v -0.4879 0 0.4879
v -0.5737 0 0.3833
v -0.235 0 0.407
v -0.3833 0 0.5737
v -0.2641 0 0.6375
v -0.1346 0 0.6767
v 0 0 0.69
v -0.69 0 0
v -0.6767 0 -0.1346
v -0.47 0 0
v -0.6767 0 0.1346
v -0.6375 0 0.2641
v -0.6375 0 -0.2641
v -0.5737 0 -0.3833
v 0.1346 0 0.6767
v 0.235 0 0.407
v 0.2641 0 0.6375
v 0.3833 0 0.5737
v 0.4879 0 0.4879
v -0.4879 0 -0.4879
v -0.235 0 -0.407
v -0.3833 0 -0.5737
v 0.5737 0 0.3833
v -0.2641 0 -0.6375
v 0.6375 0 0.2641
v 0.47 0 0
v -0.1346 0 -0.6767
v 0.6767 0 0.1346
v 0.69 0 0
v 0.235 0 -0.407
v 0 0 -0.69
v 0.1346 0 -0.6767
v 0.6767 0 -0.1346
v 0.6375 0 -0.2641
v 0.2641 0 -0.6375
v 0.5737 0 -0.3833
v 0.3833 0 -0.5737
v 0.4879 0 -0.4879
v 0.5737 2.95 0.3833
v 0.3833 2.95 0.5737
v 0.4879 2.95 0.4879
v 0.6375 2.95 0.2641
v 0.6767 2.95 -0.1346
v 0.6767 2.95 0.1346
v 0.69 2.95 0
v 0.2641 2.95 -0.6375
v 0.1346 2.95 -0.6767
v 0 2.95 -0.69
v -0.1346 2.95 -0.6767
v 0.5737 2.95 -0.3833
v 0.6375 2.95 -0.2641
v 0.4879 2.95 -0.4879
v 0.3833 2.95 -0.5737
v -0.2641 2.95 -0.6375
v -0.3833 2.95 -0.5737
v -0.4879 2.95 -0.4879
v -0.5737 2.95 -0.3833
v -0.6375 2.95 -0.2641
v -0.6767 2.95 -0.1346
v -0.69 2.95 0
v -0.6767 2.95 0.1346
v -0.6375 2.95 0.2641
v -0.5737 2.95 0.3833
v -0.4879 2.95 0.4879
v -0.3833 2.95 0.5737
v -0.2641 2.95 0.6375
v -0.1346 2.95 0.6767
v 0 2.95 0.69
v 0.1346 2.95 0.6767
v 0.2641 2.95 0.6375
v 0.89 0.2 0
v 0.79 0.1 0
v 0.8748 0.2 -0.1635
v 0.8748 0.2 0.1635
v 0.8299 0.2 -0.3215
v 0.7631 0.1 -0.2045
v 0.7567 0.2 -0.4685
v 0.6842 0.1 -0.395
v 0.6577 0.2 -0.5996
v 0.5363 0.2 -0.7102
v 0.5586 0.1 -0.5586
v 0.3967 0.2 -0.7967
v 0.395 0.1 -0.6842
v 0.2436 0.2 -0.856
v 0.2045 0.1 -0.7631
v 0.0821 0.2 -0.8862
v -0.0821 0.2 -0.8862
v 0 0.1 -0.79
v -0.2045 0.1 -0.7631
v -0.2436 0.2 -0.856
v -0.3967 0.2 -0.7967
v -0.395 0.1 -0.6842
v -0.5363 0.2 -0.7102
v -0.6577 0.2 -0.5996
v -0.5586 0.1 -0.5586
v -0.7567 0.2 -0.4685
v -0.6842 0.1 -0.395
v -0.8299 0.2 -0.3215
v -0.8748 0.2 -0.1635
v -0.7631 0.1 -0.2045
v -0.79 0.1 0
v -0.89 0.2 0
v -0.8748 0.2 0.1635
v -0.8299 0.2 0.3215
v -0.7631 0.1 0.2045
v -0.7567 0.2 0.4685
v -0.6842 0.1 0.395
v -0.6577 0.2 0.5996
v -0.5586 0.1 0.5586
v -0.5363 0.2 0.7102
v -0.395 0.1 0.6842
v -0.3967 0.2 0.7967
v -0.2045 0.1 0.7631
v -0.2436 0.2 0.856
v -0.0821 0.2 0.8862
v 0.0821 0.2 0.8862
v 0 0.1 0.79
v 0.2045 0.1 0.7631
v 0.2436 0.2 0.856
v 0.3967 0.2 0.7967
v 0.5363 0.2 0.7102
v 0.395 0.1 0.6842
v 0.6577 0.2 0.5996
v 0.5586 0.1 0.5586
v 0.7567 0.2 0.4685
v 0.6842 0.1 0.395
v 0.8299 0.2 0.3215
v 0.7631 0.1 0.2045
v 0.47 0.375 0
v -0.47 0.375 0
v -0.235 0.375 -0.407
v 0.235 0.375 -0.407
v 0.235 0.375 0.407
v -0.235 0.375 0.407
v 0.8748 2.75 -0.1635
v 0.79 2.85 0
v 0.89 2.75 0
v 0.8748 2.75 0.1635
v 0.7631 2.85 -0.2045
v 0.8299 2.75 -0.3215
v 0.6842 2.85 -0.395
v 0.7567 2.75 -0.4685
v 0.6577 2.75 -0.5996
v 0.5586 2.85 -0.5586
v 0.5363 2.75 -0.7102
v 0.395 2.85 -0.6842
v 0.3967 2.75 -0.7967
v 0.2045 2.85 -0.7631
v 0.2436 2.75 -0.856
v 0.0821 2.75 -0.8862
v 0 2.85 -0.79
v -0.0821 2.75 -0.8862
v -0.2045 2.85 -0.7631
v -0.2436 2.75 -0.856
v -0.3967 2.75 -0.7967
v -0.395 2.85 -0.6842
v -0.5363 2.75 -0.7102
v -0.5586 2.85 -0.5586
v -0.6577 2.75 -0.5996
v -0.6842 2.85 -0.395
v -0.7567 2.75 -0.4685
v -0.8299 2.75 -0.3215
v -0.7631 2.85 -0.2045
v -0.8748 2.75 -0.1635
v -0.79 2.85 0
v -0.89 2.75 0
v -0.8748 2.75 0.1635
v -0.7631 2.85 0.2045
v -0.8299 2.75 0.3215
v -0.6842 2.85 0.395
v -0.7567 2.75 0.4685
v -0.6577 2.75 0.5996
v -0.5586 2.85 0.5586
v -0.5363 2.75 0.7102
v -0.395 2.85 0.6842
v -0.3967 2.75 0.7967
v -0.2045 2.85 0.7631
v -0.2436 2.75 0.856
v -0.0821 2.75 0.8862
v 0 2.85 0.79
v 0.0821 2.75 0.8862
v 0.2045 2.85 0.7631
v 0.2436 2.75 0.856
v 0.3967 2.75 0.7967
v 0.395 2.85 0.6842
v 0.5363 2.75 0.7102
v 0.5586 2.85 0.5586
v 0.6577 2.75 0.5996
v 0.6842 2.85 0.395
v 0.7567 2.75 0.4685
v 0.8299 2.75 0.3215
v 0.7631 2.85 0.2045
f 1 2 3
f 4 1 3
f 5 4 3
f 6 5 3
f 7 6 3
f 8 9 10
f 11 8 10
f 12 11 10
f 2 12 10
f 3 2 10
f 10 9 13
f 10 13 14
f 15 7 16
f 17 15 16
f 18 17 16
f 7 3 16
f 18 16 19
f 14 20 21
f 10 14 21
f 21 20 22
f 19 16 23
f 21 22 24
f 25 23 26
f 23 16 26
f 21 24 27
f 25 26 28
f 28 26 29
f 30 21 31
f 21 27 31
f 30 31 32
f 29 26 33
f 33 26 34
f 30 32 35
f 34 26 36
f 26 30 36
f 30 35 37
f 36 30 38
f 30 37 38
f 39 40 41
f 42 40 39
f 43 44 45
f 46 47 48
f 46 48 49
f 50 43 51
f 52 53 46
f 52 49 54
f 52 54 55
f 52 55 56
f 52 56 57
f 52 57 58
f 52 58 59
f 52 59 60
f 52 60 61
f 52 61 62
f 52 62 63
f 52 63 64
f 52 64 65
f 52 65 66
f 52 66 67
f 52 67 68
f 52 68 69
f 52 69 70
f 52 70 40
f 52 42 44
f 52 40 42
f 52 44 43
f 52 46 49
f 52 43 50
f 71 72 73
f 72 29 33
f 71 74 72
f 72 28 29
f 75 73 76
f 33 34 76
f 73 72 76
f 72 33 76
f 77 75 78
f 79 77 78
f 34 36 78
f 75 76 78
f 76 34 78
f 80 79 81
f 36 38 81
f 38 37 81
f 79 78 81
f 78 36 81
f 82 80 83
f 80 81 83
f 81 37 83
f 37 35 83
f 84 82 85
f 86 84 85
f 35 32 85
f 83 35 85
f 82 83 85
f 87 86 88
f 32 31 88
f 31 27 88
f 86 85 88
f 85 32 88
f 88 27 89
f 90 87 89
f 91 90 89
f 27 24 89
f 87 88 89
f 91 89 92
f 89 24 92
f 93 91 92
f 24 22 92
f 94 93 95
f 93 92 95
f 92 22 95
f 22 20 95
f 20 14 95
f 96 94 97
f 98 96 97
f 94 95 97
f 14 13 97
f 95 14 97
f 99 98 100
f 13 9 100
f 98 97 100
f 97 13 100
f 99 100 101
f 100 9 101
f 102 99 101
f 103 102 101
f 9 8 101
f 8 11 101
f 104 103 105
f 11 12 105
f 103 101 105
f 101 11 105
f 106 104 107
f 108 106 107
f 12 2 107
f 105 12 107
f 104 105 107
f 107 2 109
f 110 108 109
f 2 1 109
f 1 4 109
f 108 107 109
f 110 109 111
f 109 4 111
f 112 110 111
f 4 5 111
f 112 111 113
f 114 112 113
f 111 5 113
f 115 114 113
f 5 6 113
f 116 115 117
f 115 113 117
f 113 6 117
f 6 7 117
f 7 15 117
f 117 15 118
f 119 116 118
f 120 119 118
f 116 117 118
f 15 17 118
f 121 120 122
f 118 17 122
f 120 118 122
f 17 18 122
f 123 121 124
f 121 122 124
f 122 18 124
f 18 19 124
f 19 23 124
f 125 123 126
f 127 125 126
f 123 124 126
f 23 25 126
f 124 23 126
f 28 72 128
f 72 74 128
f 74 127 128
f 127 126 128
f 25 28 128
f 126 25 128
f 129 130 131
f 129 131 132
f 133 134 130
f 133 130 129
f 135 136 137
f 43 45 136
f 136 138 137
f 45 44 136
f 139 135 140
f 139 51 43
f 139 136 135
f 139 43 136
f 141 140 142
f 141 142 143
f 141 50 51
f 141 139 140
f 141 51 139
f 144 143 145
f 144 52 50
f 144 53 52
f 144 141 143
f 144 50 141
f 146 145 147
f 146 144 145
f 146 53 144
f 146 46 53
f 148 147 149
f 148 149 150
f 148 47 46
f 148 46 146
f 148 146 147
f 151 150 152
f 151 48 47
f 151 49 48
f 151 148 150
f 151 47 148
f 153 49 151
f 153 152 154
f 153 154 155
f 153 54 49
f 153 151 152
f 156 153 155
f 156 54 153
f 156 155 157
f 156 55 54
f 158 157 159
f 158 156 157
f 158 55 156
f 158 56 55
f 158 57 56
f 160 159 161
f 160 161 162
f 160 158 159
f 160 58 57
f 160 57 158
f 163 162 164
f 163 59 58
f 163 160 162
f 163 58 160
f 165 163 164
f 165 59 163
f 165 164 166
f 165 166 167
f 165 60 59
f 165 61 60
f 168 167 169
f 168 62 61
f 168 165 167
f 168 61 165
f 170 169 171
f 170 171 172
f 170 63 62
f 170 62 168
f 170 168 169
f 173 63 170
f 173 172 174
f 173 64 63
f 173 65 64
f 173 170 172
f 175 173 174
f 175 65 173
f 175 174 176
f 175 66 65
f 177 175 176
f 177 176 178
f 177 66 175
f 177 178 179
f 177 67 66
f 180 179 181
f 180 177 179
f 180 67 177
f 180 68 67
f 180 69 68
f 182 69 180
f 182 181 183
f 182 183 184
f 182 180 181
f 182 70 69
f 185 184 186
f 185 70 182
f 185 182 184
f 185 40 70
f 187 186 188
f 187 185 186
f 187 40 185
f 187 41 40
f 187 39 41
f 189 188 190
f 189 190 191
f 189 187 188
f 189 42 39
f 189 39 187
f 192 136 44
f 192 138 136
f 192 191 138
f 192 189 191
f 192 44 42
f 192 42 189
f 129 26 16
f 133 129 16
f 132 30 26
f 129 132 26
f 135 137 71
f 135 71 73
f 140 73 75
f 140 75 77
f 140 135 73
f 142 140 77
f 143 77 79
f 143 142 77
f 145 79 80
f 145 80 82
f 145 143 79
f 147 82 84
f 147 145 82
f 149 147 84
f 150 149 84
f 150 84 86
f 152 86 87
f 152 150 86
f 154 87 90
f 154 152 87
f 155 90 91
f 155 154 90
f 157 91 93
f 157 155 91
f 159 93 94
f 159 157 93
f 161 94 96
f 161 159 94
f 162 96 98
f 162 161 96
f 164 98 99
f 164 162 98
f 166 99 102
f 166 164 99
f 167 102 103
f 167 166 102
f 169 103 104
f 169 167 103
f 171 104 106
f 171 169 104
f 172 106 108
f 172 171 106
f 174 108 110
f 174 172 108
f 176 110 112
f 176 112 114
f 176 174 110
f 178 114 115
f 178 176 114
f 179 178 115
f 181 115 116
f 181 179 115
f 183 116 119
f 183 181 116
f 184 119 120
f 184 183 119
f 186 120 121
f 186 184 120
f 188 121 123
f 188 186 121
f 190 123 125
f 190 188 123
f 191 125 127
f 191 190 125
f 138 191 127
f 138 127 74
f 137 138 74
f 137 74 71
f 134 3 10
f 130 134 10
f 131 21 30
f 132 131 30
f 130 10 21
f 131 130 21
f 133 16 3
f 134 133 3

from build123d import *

# Parameters (mm, degrees)
SKETCH1_W          = 0.89
SKETCH1_H          = 2.95
CUT_EXTRUDE1_DEPTH = 0.375
CHAMFER1_SIZE      = 0.2


with BuildPart() as part:
    # Sketch1 → Revolve1 (revolve)
    with BuildSketch(Plane(origin=(0, 0, 0), x_dir=(-1, 0, 0), z_dir=(0, 0, -1))):
        with Locations((-0.445, 1.475)):
            Rectangle(SKETCH1_W, SKETCH1_H)
    revolve(axis=Axis((0, 0, 0), (0, 1, 0)))

    # Sketch2 → Cut-Extrude1 (cut)
    with BuildSketch(Plane.XZ):
        Polygon((-0.235, 0.40703194), (-0.47, 0), (-0.235, -0.40703194), (0.235, -0.40703194), (0.47, 0), (0.235, 0.40703194), align=None)
    extrude(amount=-CUT_EXTRUDE1_DEPTH, mode=Mode.SUBTRACT)

    # Chamfer1
    chamfer1_edges = [part.edges().sort_by_distance(p)[0] for p in [
        (-0.89, 2.95, 0),
        (-0.89, 0, 0),
    ]]
    chamfer(chamfer1_edges, length=CHAMFER1_SIZE)


solid = part.part
